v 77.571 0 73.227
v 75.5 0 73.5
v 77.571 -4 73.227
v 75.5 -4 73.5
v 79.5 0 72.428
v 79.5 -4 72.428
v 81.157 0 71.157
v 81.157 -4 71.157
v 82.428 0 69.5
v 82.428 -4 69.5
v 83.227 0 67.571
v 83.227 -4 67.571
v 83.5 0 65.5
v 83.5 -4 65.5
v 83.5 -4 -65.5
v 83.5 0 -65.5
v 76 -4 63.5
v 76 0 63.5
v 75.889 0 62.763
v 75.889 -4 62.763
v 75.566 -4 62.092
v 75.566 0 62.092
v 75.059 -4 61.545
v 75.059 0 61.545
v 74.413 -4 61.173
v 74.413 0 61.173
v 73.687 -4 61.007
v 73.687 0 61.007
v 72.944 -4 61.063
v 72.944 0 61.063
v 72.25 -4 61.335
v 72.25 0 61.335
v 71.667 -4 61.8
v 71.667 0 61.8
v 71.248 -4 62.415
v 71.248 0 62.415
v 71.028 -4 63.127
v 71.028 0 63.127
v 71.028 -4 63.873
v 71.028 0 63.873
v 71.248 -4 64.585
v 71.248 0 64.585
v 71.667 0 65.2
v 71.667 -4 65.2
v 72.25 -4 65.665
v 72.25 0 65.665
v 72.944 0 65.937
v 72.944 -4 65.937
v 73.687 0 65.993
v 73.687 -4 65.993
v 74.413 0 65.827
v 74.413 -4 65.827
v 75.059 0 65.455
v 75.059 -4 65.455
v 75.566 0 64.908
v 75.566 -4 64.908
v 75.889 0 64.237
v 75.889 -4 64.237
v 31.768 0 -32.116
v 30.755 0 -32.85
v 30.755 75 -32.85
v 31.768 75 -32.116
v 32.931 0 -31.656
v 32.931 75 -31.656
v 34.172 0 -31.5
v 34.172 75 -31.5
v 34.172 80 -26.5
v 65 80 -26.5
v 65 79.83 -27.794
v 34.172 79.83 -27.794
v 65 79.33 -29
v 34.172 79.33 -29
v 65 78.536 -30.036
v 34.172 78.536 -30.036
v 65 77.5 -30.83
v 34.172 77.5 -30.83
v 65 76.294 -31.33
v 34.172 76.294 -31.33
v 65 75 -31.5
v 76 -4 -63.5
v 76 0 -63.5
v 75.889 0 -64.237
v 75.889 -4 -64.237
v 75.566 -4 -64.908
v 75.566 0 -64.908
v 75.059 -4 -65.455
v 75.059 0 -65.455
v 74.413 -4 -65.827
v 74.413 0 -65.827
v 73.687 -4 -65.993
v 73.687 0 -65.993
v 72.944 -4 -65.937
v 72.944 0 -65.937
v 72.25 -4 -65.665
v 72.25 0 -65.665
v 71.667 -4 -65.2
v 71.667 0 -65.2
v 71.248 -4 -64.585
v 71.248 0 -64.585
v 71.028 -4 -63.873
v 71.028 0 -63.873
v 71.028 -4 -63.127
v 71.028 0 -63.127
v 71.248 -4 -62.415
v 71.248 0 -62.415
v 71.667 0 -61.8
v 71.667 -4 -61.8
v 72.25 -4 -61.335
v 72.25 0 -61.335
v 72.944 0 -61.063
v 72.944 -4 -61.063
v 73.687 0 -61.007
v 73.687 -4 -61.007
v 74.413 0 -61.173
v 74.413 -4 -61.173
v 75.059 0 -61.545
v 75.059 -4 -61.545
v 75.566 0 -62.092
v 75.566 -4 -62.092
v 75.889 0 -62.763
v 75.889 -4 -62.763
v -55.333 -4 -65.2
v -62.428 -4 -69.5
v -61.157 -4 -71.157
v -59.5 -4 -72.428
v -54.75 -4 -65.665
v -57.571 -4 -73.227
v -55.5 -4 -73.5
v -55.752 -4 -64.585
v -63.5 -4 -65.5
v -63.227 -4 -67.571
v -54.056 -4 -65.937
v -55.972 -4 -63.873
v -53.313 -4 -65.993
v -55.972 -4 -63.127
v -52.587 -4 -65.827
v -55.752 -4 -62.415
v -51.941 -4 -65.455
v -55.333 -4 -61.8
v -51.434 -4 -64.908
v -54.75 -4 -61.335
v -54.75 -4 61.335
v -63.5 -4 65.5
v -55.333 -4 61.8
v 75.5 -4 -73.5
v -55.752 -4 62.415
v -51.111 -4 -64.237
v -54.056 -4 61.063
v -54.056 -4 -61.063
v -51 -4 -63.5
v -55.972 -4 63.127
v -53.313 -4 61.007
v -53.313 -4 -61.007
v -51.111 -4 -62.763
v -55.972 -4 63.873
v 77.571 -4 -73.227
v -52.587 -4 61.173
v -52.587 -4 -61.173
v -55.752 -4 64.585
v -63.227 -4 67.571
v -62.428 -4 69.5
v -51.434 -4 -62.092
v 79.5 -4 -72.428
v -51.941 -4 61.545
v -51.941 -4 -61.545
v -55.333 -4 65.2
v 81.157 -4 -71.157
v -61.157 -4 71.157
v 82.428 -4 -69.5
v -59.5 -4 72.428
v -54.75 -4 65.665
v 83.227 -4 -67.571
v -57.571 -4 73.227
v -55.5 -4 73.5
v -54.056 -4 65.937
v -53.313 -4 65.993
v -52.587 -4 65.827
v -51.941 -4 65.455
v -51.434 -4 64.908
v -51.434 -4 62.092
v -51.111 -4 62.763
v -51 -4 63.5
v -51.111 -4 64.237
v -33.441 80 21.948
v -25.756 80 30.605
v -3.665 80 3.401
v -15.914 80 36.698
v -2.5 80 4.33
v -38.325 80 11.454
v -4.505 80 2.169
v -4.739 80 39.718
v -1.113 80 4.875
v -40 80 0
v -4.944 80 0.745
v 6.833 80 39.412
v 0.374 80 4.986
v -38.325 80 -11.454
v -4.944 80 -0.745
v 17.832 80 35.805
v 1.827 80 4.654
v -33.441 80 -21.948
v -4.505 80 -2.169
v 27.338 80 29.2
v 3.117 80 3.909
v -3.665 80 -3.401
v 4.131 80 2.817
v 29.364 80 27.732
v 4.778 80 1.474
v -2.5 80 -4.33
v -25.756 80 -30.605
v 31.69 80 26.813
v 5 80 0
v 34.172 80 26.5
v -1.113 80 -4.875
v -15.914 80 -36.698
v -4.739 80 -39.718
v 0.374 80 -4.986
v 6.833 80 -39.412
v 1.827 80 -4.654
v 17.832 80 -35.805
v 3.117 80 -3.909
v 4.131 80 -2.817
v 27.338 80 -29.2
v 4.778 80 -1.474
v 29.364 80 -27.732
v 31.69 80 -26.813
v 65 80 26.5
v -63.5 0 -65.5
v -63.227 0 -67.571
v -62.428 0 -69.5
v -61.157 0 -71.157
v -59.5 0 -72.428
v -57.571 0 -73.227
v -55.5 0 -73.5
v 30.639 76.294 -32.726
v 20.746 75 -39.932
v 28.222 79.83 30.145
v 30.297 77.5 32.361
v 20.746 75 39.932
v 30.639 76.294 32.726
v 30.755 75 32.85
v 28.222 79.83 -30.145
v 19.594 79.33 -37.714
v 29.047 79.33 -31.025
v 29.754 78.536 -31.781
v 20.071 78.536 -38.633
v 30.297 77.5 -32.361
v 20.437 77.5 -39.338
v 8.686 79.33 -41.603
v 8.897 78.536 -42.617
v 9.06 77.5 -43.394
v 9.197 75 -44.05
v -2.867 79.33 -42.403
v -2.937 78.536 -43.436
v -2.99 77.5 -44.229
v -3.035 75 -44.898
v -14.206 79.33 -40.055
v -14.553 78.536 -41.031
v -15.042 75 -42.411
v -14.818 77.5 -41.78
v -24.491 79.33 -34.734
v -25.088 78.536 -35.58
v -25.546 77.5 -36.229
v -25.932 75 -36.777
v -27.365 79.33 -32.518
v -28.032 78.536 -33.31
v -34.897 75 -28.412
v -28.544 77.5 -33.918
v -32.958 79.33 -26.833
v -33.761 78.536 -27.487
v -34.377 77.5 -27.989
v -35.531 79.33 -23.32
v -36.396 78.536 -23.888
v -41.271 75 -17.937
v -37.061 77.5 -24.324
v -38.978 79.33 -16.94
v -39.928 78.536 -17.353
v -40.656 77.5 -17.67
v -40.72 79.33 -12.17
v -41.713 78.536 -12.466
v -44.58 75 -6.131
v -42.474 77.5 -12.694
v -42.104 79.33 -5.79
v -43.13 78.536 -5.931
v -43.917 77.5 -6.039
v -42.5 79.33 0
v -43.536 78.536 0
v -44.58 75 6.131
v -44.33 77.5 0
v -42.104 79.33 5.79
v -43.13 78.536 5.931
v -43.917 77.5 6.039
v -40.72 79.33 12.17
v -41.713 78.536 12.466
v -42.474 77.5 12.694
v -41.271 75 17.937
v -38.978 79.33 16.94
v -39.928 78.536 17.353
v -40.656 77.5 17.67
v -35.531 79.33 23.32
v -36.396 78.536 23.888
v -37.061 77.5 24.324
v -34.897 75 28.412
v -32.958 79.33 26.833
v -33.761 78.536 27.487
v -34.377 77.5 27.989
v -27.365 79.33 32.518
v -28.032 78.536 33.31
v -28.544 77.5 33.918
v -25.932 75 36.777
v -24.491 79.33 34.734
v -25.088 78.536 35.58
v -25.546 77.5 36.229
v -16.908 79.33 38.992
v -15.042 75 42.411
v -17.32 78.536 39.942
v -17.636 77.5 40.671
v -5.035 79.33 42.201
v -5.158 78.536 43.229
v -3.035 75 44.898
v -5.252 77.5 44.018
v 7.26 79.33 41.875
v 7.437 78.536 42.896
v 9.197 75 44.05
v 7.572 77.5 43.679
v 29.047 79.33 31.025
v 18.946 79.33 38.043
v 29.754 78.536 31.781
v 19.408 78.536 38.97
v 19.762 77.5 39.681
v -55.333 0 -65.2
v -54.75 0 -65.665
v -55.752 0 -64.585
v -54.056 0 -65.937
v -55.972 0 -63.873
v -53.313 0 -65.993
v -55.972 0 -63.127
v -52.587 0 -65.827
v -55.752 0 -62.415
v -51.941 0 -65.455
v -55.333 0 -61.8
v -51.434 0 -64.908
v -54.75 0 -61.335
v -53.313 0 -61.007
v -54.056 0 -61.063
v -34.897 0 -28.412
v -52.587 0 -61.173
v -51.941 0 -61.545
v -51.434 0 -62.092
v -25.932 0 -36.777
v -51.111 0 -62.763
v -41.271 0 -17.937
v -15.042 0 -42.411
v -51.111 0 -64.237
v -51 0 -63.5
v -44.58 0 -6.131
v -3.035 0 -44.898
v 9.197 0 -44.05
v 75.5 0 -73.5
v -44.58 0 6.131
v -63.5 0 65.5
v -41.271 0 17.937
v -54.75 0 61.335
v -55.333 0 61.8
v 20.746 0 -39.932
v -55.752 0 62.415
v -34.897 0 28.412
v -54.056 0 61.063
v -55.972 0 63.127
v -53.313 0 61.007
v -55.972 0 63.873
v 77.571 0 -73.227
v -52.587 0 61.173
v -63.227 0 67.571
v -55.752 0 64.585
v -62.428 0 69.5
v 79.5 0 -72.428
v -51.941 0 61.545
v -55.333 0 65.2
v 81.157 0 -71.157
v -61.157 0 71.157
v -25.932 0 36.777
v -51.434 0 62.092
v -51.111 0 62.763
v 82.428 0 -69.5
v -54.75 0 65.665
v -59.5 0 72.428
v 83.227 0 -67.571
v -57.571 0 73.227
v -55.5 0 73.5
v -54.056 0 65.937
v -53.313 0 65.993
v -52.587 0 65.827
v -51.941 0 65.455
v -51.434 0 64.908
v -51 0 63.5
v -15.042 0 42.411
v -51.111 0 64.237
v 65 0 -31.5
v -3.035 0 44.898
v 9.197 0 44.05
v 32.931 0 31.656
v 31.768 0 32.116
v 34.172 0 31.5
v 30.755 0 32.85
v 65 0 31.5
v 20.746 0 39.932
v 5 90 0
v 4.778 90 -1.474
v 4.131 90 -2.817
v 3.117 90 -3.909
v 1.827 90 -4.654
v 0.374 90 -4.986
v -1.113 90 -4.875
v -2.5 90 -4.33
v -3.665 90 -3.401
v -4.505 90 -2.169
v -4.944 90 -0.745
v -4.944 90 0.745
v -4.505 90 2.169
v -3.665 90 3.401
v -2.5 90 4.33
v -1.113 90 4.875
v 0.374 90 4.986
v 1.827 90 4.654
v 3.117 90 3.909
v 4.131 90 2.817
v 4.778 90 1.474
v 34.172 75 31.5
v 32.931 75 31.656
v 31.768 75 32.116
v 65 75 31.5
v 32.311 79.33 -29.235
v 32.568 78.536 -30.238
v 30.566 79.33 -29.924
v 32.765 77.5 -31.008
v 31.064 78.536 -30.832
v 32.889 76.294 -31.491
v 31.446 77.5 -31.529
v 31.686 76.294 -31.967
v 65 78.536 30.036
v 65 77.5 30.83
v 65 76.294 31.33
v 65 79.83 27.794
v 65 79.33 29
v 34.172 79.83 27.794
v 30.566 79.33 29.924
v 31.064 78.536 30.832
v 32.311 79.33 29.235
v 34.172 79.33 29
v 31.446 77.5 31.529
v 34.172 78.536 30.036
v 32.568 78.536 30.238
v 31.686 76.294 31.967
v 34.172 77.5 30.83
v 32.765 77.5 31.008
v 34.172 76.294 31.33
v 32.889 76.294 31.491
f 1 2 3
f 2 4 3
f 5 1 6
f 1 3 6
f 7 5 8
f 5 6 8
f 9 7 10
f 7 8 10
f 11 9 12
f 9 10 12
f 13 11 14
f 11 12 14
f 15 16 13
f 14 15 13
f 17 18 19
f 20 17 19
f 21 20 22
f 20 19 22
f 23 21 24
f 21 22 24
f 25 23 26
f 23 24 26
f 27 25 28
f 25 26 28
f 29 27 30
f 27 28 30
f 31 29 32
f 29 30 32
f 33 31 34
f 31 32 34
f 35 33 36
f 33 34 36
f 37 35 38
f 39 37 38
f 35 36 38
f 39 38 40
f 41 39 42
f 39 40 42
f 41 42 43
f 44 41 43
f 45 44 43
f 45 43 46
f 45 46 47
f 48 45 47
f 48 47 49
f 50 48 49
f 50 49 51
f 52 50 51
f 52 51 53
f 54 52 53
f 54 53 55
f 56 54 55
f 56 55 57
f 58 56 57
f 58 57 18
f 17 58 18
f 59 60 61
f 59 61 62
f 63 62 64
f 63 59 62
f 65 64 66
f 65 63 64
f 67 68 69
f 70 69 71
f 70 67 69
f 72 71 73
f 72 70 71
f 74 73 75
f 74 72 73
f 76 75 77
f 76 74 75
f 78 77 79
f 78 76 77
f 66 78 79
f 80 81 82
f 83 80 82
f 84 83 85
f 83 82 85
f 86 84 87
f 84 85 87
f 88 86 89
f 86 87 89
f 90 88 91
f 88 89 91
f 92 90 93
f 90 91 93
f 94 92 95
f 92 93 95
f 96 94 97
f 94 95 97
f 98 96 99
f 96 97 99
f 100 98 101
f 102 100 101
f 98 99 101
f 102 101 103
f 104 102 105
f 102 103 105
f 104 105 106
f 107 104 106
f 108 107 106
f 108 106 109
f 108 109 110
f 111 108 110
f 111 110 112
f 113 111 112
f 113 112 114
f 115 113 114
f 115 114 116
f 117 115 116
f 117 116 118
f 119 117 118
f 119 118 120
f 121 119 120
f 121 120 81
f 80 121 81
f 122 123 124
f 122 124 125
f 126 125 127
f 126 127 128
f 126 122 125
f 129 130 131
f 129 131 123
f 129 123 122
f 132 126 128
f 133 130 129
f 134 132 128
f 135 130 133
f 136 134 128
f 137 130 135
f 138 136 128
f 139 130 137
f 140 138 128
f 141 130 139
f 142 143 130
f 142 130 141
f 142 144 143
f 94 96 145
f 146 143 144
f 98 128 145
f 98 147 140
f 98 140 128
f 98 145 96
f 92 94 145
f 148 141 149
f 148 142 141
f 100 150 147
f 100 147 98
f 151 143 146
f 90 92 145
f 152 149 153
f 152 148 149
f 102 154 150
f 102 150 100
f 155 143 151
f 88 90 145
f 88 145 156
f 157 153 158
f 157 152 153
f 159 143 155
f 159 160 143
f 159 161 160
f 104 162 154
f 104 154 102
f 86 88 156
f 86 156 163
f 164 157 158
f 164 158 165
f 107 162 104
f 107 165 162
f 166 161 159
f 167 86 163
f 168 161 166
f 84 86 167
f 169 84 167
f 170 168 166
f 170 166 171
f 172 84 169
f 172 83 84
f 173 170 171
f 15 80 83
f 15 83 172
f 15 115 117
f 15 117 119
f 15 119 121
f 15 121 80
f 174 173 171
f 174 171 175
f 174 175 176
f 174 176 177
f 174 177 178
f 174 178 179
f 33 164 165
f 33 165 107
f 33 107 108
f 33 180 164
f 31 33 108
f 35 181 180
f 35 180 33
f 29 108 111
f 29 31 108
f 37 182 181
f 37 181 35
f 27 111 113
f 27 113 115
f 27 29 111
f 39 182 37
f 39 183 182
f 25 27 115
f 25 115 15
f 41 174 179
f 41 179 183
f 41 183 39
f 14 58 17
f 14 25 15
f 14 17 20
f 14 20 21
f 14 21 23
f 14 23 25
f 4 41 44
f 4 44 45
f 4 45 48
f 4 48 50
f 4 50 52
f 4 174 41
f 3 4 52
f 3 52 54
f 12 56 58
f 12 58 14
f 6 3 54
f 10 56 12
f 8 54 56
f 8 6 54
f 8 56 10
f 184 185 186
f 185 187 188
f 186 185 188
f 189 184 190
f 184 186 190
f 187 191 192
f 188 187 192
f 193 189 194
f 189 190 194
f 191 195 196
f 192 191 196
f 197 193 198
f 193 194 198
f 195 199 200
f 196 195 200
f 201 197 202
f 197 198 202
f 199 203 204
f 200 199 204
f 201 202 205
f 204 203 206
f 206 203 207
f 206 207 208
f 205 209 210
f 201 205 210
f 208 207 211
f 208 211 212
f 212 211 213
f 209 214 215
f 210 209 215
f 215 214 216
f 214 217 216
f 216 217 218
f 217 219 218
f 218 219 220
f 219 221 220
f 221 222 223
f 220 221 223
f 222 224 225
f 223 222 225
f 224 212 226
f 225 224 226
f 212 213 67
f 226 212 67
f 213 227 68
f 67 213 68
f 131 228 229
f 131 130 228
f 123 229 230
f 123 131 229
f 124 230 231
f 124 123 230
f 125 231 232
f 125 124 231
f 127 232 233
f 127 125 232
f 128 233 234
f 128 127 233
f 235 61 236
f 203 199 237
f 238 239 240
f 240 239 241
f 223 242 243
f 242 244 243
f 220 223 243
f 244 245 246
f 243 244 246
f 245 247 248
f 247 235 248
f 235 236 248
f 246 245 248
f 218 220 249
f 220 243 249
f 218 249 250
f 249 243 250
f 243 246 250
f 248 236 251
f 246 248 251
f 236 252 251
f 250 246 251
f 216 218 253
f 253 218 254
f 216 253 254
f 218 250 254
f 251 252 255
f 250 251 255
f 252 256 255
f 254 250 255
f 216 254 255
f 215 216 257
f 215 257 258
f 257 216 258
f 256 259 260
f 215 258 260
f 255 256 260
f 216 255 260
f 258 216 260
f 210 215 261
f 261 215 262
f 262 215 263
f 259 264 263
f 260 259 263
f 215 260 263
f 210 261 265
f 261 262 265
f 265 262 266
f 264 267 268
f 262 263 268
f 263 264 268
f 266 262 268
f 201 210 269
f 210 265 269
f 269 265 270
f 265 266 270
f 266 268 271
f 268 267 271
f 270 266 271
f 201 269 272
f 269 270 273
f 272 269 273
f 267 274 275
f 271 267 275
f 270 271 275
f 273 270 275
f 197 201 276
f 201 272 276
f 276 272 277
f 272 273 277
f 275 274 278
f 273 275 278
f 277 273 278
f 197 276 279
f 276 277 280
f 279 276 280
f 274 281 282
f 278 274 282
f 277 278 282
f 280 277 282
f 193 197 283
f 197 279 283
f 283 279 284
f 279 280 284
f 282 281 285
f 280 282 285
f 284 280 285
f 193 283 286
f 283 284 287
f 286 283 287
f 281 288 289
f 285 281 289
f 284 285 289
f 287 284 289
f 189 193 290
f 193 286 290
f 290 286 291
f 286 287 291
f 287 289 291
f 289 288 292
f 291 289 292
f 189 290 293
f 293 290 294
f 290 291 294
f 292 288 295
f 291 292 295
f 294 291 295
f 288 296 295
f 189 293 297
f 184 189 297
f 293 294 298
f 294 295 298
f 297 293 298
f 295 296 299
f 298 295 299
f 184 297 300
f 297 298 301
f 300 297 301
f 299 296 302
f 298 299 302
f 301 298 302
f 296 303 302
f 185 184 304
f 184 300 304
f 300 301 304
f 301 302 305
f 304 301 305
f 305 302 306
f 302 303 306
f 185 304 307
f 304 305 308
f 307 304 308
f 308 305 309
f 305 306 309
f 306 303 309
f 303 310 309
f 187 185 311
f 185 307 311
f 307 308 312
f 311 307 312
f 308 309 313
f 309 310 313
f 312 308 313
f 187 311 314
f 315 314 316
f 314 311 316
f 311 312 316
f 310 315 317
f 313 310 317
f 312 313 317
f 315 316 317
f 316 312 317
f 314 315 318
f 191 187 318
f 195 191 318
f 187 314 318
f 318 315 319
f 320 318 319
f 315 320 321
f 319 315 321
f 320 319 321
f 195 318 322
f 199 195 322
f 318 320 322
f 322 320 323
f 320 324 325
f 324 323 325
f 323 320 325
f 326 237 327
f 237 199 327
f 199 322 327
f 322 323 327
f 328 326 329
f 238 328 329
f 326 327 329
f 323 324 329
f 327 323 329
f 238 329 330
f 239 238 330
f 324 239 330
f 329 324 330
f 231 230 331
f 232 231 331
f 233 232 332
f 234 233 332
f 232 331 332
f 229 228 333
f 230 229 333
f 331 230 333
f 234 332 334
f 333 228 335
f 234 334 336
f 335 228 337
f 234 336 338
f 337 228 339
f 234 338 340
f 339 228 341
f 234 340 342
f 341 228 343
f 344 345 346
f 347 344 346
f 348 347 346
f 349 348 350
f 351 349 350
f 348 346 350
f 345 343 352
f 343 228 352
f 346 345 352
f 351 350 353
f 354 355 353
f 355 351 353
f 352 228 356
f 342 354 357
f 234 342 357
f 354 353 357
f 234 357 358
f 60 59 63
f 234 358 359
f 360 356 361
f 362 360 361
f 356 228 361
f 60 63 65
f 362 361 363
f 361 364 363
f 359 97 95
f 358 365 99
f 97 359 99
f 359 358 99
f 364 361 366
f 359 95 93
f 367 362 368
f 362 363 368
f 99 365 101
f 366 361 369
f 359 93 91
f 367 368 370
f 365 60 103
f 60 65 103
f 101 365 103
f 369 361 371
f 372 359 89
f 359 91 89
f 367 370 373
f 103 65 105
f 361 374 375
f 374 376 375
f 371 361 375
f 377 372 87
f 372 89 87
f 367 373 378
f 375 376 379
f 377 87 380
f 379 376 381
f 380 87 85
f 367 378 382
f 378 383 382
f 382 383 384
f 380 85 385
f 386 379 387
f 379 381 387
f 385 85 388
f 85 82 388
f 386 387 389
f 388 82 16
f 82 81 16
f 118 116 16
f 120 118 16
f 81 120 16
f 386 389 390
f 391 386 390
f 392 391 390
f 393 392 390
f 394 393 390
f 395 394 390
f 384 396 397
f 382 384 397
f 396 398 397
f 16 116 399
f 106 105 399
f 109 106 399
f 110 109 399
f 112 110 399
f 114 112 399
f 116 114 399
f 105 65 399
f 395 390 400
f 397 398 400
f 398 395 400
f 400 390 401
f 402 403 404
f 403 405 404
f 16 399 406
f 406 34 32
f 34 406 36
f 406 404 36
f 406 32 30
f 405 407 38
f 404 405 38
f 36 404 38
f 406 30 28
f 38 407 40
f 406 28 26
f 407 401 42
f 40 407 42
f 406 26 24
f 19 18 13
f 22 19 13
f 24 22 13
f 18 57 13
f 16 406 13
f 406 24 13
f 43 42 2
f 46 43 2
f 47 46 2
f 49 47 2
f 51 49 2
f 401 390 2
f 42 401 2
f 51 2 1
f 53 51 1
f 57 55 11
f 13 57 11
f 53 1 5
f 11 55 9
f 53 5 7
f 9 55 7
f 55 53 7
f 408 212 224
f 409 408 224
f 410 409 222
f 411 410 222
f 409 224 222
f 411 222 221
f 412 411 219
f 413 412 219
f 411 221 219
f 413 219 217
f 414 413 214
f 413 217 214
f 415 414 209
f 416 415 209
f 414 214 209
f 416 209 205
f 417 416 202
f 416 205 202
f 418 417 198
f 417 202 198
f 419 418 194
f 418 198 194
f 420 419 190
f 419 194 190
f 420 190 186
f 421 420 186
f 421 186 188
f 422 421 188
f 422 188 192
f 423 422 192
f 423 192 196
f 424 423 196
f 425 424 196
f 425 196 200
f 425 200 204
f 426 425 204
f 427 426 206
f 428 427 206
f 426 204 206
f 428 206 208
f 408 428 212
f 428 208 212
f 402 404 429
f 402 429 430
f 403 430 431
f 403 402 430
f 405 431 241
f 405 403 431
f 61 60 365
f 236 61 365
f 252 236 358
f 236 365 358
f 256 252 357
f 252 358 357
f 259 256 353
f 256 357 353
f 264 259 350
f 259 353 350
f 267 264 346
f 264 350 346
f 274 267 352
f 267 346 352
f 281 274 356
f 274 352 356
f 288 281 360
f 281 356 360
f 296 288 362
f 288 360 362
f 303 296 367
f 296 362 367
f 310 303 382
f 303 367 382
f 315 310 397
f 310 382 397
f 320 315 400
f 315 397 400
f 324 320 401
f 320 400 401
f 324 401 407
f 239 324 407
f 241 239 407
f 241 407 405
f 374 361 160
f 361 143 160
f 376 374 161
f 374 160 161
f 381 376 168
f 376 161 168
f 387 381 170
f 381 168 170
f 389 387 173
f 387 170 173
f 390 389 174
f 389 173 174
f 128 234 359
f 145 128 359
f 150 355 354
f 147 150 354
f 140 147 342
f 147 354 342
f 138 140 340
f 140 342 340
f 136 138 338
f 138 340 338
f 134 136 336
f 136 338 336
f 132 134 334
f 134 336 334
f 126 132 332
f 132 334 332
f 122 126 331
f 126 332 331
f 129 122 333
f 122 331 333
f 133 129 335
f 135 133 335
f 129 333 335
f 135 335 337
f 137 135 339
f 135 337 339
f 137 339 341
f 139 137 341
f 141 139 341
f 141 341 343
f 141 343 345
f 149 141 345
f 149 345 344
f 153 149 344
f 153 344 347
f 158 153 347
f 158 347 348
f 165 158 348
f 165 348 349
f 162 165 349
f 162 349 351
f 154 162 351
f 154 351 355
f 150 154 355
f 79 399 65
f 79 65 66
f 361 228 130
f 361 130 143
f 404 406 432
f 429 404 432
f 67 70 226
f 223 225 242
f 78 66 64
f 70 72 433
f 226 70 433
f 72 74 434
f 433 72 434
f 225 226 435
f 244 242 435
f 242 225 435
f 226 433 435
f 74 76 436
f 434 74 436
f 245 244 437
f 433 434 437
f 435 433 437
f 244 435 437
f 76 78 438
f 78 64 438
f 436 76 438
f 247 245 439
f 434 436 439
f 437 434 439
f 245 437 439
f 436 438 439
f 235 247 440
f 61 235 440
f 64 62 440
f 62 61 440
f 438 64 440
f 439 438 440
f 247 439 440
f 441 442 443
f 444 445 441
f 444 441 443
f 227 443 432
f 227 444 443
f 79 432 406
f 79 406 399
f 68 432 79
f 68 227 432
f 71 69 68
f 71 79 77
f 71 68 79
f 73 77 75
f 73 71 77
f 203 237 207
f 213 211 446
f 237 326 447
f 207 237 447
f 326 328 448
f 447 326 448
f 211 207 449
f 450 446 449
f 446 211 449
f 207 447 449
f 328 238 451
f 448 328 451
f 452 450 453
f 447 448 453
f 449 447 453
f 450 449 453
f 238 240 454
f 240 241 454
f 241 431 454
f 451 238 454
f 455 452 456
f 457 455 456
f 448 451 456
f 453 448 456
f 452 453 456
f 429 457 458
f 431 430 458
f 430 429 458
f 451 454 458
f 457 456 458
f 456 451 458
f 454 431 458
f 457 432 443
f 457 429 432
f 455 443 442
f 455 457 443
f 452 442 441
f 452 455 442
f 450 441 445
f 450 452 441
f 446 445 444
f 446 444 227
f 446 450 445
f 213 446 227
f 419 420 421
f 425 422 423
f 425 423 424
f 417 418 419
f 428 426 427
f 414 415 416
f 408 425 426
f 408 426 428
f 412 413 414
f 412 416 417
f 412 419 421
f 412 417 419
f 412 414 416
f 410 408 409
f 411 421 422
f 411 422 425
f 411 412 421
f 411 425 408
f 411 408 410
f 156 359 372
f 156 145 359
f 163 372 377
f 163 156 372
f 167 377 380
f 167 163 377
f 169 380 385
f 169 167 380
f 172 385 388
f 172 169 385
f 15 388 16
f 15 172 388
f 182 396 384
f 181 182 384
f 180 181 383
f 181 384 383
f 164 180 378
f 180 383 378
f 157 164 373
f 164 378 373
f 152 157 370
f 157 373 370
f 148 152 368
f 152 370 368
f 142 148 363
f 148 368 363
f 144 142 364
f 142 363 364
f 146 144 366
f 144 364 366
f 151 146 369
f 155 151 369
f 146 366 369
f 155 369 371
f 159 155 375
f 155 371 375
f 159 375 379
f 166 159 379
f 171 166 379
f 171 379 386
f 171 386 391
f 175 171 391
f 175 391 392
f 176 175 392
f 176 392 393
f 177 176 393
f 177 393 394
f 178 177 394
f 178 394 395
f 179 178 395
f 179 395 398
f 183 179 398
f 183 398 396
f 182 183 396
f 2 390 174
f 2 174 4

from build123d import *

# Parameters (mm, degrees)
SKETCH1_R           = 45
BOSS_EXTRUDE1_DEPTH = 80
BOSS_EXTRUDE2_REACH = 112
SKETCH2_W           = 63
SKETCH2_H           = 80
FILLET1_R           = 5
SKETCH3_R           = 5
BOSS_EXTRUDE3_DEPTH = 10
SKETCH4_W           = 147
SKETCH4_H           = 147
BOSS_EXTRUDE4_DEPTH = 4
SKETCH5_R           = 2.5
CUT_EXTRUDE1_DEPTH  = 5
FILLET2_R           = 8


with BuildPart() as part:
    # Sketch1 → Boss-Extrude1 (new body)
    with BuildSketch(Plane(origin=(0, 0, 0), x_dir=(1, 0, 0), z_dir=(0, 1, 0))):
        Circle(SKETCH1_R)
    extrude(amount=BOSS_EXTRUDE1_DEPTH)

    # Sketch2 → Boss-Extrude2 (add, up to next)
    with BuildSketch(Plane(origin=(65, 0, 0), x_dir=(0, 0, -1), z_dir=(1, 0, 0)), mode=Mode.PRIVATE) as boss_extrude2_sk1:
        with Locations((0, 40)):
            Rectangle(SKETCH2_W, SKETCH2_H)
    boss_extrude2_tool1 = extrude(boss_extrude2_sk1.sketch, amount=-BOSS_EXTRUDE2_REACH, mode=Mode.PRIVATE) - part.part
    add(boss_extrude2_tool1.solids().sort_by_distance((65, 40, 0))[0])

    # Fillet1
    fillet1_edges = [part.edges().sort_by_distance(p)[0] for p in [
        (-45, 80, 0),
        (32.136427928, 40, -31.5),
        (48.568213964, 80, -31.5),
        (48.568213964, 80, 31.5),
        (32.136427928, 40, 31.5),
    ]]
    fillet(fillet1_edges, radius=FILLET1_R)

    # Sketch3 → Boss-Extrude3 (add)
    with BuildSketch(Plane(origin=(0, 80, 0), x_dir=(1, 0, 0), z_dir=(0, 1, 0))):
        Circle(SKETCH3_R)
    extrude(amount=BOSS_EXTRUDE3_DEPTH)

    # Sketch4 → Boss-Extrude4 (add)
    with BuildSketch(Plane.XZ):
        with Locations((10, 0)):
            Rectangle(SKETCH4_W, SKETCH4_H)
    extrude(amount=BOSS_EXTRUDE4_DEPTH)

    # Sketch5 → Cut-Extrude1 (cut, through all)
    with BuildSketch(Plane(origin=(0, 0, 0), x_dir=(1, 0, 0), z_dir=(0, 1, 0))):
        with Locations((-53.5, 63.5)):
            Circle(SKETCH5_R)
        with Locations((73.5, 63.5)):
            Circle(SKETCH5_R)
        with Locations((-53.5, -63.5)):
            Circle(SKETCH5_R)
        with Locations((73.5, -63.5)):
            Circle(SKETCH5_R)
    extrude(amount=-CUT_EXTRUDE1_DEPTH, mode=Mode.SUBTRACT)

    # Fillet2
    fillet2_edges = [part.edges().sort_by_distance(p)[0] for p in [
        (-63.5, -2, 73.5),
        (-63.5, -2, -73.5),
        (83.5, -2, -73.5),
        (83.5, -2, 73.5),
    ]]
    fillet(fillet2_edges, radius=FILLET2_R)


solid = part.part
